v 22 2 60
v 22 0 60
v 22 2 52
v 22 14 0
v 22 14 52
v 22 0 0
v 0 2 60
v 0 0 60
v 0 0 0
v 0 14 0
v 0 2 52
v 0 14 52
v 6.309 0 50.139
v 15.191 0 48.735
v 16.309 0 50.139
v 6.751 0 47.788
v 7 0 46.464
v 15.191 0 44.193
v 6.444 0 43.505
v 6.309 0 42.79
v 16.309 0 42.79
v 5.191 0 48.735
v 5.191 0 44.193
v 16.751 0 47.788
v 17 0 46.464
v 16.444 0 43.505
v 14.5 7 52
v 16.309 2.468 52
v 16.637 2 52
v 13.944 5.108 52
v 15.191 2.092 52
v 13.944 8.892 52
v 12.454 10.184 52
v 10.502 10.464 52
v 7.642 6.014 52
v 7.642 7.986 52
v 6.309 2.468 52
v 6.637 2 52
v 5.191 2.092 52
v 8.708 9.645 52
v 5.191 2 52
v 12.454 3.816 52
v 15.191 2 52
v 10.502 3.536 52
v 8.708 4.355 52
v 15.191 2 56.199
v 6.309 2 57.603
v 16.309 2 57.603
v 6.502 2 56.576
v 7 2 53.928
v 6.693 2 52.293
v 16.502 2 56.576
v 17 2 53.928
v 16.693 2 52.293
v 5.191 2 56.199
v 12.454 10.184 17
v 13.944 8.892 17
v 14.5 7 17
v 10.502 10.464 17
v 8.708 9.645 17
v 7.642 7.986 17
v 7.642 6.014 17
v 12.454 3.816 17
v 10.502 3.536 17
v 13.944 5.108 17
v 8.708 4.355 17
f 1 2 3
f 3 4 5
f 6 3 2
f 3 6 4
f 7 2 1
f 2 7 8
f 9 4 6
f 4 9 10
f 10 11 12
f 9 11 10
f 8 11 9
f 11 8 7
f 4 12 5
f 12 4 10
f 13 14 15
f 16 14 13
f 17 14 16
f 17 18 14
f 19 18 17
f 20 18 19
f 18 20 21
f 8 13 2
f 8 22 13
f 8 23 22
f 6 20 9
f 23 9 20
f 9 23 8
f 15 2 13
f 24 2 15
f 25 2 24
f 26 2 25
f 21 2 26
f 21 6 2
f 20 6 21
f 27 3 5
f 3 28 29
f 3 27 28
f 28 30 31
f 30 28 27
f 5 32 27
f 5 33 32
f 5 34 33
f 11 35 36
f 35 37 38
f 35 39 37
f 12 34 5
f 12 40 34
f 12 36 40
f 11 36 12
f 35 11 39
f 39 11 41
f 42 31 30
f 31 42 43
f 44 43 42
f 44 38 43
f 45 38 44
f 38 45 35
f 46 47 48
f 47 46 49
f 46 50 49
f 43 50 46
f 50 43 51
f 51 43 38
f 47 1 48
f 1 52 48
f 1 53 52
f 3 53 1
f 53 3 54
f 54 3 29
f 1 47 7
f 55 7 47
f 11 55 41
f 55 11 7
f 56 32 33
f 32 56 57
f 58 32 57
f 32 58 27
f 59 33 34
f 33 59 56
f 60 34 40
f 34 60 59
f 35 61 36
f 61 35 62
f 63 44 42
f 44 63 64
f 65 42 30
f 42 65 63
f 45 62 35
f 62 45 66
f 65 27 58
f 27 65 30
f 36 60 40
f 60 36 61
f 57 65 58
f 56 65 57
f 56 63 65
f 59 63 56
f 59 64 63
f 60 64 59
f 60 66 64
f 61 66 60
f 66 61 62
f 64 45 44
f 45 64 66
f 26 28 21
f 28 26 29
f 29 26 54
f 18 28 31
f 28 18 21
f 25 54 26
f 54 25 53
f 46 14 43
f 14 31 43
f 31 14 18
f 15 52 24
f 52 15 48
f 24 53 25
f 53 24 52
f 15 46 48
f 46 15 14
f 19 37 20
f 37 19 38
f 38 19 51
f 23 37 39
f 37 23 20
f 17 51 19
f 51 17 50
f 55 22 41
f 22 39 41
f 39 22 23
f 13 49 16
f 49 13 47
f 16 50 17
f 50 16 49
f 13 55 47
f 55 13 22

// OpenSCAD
difference()
{
	cube([22,14,60]);
	translate([-1,2,52]) cube([25,14,9]);
	translate([11,7,17]) cylinder(h=36,d=7);
	translate([16,-2,39]) rotate([-15,0,0]) cylinder(h=25,d=2);
	translate([ 6,-2,39]) rotate([-15,0,0]) cylinder(h=25,d=2);
}
